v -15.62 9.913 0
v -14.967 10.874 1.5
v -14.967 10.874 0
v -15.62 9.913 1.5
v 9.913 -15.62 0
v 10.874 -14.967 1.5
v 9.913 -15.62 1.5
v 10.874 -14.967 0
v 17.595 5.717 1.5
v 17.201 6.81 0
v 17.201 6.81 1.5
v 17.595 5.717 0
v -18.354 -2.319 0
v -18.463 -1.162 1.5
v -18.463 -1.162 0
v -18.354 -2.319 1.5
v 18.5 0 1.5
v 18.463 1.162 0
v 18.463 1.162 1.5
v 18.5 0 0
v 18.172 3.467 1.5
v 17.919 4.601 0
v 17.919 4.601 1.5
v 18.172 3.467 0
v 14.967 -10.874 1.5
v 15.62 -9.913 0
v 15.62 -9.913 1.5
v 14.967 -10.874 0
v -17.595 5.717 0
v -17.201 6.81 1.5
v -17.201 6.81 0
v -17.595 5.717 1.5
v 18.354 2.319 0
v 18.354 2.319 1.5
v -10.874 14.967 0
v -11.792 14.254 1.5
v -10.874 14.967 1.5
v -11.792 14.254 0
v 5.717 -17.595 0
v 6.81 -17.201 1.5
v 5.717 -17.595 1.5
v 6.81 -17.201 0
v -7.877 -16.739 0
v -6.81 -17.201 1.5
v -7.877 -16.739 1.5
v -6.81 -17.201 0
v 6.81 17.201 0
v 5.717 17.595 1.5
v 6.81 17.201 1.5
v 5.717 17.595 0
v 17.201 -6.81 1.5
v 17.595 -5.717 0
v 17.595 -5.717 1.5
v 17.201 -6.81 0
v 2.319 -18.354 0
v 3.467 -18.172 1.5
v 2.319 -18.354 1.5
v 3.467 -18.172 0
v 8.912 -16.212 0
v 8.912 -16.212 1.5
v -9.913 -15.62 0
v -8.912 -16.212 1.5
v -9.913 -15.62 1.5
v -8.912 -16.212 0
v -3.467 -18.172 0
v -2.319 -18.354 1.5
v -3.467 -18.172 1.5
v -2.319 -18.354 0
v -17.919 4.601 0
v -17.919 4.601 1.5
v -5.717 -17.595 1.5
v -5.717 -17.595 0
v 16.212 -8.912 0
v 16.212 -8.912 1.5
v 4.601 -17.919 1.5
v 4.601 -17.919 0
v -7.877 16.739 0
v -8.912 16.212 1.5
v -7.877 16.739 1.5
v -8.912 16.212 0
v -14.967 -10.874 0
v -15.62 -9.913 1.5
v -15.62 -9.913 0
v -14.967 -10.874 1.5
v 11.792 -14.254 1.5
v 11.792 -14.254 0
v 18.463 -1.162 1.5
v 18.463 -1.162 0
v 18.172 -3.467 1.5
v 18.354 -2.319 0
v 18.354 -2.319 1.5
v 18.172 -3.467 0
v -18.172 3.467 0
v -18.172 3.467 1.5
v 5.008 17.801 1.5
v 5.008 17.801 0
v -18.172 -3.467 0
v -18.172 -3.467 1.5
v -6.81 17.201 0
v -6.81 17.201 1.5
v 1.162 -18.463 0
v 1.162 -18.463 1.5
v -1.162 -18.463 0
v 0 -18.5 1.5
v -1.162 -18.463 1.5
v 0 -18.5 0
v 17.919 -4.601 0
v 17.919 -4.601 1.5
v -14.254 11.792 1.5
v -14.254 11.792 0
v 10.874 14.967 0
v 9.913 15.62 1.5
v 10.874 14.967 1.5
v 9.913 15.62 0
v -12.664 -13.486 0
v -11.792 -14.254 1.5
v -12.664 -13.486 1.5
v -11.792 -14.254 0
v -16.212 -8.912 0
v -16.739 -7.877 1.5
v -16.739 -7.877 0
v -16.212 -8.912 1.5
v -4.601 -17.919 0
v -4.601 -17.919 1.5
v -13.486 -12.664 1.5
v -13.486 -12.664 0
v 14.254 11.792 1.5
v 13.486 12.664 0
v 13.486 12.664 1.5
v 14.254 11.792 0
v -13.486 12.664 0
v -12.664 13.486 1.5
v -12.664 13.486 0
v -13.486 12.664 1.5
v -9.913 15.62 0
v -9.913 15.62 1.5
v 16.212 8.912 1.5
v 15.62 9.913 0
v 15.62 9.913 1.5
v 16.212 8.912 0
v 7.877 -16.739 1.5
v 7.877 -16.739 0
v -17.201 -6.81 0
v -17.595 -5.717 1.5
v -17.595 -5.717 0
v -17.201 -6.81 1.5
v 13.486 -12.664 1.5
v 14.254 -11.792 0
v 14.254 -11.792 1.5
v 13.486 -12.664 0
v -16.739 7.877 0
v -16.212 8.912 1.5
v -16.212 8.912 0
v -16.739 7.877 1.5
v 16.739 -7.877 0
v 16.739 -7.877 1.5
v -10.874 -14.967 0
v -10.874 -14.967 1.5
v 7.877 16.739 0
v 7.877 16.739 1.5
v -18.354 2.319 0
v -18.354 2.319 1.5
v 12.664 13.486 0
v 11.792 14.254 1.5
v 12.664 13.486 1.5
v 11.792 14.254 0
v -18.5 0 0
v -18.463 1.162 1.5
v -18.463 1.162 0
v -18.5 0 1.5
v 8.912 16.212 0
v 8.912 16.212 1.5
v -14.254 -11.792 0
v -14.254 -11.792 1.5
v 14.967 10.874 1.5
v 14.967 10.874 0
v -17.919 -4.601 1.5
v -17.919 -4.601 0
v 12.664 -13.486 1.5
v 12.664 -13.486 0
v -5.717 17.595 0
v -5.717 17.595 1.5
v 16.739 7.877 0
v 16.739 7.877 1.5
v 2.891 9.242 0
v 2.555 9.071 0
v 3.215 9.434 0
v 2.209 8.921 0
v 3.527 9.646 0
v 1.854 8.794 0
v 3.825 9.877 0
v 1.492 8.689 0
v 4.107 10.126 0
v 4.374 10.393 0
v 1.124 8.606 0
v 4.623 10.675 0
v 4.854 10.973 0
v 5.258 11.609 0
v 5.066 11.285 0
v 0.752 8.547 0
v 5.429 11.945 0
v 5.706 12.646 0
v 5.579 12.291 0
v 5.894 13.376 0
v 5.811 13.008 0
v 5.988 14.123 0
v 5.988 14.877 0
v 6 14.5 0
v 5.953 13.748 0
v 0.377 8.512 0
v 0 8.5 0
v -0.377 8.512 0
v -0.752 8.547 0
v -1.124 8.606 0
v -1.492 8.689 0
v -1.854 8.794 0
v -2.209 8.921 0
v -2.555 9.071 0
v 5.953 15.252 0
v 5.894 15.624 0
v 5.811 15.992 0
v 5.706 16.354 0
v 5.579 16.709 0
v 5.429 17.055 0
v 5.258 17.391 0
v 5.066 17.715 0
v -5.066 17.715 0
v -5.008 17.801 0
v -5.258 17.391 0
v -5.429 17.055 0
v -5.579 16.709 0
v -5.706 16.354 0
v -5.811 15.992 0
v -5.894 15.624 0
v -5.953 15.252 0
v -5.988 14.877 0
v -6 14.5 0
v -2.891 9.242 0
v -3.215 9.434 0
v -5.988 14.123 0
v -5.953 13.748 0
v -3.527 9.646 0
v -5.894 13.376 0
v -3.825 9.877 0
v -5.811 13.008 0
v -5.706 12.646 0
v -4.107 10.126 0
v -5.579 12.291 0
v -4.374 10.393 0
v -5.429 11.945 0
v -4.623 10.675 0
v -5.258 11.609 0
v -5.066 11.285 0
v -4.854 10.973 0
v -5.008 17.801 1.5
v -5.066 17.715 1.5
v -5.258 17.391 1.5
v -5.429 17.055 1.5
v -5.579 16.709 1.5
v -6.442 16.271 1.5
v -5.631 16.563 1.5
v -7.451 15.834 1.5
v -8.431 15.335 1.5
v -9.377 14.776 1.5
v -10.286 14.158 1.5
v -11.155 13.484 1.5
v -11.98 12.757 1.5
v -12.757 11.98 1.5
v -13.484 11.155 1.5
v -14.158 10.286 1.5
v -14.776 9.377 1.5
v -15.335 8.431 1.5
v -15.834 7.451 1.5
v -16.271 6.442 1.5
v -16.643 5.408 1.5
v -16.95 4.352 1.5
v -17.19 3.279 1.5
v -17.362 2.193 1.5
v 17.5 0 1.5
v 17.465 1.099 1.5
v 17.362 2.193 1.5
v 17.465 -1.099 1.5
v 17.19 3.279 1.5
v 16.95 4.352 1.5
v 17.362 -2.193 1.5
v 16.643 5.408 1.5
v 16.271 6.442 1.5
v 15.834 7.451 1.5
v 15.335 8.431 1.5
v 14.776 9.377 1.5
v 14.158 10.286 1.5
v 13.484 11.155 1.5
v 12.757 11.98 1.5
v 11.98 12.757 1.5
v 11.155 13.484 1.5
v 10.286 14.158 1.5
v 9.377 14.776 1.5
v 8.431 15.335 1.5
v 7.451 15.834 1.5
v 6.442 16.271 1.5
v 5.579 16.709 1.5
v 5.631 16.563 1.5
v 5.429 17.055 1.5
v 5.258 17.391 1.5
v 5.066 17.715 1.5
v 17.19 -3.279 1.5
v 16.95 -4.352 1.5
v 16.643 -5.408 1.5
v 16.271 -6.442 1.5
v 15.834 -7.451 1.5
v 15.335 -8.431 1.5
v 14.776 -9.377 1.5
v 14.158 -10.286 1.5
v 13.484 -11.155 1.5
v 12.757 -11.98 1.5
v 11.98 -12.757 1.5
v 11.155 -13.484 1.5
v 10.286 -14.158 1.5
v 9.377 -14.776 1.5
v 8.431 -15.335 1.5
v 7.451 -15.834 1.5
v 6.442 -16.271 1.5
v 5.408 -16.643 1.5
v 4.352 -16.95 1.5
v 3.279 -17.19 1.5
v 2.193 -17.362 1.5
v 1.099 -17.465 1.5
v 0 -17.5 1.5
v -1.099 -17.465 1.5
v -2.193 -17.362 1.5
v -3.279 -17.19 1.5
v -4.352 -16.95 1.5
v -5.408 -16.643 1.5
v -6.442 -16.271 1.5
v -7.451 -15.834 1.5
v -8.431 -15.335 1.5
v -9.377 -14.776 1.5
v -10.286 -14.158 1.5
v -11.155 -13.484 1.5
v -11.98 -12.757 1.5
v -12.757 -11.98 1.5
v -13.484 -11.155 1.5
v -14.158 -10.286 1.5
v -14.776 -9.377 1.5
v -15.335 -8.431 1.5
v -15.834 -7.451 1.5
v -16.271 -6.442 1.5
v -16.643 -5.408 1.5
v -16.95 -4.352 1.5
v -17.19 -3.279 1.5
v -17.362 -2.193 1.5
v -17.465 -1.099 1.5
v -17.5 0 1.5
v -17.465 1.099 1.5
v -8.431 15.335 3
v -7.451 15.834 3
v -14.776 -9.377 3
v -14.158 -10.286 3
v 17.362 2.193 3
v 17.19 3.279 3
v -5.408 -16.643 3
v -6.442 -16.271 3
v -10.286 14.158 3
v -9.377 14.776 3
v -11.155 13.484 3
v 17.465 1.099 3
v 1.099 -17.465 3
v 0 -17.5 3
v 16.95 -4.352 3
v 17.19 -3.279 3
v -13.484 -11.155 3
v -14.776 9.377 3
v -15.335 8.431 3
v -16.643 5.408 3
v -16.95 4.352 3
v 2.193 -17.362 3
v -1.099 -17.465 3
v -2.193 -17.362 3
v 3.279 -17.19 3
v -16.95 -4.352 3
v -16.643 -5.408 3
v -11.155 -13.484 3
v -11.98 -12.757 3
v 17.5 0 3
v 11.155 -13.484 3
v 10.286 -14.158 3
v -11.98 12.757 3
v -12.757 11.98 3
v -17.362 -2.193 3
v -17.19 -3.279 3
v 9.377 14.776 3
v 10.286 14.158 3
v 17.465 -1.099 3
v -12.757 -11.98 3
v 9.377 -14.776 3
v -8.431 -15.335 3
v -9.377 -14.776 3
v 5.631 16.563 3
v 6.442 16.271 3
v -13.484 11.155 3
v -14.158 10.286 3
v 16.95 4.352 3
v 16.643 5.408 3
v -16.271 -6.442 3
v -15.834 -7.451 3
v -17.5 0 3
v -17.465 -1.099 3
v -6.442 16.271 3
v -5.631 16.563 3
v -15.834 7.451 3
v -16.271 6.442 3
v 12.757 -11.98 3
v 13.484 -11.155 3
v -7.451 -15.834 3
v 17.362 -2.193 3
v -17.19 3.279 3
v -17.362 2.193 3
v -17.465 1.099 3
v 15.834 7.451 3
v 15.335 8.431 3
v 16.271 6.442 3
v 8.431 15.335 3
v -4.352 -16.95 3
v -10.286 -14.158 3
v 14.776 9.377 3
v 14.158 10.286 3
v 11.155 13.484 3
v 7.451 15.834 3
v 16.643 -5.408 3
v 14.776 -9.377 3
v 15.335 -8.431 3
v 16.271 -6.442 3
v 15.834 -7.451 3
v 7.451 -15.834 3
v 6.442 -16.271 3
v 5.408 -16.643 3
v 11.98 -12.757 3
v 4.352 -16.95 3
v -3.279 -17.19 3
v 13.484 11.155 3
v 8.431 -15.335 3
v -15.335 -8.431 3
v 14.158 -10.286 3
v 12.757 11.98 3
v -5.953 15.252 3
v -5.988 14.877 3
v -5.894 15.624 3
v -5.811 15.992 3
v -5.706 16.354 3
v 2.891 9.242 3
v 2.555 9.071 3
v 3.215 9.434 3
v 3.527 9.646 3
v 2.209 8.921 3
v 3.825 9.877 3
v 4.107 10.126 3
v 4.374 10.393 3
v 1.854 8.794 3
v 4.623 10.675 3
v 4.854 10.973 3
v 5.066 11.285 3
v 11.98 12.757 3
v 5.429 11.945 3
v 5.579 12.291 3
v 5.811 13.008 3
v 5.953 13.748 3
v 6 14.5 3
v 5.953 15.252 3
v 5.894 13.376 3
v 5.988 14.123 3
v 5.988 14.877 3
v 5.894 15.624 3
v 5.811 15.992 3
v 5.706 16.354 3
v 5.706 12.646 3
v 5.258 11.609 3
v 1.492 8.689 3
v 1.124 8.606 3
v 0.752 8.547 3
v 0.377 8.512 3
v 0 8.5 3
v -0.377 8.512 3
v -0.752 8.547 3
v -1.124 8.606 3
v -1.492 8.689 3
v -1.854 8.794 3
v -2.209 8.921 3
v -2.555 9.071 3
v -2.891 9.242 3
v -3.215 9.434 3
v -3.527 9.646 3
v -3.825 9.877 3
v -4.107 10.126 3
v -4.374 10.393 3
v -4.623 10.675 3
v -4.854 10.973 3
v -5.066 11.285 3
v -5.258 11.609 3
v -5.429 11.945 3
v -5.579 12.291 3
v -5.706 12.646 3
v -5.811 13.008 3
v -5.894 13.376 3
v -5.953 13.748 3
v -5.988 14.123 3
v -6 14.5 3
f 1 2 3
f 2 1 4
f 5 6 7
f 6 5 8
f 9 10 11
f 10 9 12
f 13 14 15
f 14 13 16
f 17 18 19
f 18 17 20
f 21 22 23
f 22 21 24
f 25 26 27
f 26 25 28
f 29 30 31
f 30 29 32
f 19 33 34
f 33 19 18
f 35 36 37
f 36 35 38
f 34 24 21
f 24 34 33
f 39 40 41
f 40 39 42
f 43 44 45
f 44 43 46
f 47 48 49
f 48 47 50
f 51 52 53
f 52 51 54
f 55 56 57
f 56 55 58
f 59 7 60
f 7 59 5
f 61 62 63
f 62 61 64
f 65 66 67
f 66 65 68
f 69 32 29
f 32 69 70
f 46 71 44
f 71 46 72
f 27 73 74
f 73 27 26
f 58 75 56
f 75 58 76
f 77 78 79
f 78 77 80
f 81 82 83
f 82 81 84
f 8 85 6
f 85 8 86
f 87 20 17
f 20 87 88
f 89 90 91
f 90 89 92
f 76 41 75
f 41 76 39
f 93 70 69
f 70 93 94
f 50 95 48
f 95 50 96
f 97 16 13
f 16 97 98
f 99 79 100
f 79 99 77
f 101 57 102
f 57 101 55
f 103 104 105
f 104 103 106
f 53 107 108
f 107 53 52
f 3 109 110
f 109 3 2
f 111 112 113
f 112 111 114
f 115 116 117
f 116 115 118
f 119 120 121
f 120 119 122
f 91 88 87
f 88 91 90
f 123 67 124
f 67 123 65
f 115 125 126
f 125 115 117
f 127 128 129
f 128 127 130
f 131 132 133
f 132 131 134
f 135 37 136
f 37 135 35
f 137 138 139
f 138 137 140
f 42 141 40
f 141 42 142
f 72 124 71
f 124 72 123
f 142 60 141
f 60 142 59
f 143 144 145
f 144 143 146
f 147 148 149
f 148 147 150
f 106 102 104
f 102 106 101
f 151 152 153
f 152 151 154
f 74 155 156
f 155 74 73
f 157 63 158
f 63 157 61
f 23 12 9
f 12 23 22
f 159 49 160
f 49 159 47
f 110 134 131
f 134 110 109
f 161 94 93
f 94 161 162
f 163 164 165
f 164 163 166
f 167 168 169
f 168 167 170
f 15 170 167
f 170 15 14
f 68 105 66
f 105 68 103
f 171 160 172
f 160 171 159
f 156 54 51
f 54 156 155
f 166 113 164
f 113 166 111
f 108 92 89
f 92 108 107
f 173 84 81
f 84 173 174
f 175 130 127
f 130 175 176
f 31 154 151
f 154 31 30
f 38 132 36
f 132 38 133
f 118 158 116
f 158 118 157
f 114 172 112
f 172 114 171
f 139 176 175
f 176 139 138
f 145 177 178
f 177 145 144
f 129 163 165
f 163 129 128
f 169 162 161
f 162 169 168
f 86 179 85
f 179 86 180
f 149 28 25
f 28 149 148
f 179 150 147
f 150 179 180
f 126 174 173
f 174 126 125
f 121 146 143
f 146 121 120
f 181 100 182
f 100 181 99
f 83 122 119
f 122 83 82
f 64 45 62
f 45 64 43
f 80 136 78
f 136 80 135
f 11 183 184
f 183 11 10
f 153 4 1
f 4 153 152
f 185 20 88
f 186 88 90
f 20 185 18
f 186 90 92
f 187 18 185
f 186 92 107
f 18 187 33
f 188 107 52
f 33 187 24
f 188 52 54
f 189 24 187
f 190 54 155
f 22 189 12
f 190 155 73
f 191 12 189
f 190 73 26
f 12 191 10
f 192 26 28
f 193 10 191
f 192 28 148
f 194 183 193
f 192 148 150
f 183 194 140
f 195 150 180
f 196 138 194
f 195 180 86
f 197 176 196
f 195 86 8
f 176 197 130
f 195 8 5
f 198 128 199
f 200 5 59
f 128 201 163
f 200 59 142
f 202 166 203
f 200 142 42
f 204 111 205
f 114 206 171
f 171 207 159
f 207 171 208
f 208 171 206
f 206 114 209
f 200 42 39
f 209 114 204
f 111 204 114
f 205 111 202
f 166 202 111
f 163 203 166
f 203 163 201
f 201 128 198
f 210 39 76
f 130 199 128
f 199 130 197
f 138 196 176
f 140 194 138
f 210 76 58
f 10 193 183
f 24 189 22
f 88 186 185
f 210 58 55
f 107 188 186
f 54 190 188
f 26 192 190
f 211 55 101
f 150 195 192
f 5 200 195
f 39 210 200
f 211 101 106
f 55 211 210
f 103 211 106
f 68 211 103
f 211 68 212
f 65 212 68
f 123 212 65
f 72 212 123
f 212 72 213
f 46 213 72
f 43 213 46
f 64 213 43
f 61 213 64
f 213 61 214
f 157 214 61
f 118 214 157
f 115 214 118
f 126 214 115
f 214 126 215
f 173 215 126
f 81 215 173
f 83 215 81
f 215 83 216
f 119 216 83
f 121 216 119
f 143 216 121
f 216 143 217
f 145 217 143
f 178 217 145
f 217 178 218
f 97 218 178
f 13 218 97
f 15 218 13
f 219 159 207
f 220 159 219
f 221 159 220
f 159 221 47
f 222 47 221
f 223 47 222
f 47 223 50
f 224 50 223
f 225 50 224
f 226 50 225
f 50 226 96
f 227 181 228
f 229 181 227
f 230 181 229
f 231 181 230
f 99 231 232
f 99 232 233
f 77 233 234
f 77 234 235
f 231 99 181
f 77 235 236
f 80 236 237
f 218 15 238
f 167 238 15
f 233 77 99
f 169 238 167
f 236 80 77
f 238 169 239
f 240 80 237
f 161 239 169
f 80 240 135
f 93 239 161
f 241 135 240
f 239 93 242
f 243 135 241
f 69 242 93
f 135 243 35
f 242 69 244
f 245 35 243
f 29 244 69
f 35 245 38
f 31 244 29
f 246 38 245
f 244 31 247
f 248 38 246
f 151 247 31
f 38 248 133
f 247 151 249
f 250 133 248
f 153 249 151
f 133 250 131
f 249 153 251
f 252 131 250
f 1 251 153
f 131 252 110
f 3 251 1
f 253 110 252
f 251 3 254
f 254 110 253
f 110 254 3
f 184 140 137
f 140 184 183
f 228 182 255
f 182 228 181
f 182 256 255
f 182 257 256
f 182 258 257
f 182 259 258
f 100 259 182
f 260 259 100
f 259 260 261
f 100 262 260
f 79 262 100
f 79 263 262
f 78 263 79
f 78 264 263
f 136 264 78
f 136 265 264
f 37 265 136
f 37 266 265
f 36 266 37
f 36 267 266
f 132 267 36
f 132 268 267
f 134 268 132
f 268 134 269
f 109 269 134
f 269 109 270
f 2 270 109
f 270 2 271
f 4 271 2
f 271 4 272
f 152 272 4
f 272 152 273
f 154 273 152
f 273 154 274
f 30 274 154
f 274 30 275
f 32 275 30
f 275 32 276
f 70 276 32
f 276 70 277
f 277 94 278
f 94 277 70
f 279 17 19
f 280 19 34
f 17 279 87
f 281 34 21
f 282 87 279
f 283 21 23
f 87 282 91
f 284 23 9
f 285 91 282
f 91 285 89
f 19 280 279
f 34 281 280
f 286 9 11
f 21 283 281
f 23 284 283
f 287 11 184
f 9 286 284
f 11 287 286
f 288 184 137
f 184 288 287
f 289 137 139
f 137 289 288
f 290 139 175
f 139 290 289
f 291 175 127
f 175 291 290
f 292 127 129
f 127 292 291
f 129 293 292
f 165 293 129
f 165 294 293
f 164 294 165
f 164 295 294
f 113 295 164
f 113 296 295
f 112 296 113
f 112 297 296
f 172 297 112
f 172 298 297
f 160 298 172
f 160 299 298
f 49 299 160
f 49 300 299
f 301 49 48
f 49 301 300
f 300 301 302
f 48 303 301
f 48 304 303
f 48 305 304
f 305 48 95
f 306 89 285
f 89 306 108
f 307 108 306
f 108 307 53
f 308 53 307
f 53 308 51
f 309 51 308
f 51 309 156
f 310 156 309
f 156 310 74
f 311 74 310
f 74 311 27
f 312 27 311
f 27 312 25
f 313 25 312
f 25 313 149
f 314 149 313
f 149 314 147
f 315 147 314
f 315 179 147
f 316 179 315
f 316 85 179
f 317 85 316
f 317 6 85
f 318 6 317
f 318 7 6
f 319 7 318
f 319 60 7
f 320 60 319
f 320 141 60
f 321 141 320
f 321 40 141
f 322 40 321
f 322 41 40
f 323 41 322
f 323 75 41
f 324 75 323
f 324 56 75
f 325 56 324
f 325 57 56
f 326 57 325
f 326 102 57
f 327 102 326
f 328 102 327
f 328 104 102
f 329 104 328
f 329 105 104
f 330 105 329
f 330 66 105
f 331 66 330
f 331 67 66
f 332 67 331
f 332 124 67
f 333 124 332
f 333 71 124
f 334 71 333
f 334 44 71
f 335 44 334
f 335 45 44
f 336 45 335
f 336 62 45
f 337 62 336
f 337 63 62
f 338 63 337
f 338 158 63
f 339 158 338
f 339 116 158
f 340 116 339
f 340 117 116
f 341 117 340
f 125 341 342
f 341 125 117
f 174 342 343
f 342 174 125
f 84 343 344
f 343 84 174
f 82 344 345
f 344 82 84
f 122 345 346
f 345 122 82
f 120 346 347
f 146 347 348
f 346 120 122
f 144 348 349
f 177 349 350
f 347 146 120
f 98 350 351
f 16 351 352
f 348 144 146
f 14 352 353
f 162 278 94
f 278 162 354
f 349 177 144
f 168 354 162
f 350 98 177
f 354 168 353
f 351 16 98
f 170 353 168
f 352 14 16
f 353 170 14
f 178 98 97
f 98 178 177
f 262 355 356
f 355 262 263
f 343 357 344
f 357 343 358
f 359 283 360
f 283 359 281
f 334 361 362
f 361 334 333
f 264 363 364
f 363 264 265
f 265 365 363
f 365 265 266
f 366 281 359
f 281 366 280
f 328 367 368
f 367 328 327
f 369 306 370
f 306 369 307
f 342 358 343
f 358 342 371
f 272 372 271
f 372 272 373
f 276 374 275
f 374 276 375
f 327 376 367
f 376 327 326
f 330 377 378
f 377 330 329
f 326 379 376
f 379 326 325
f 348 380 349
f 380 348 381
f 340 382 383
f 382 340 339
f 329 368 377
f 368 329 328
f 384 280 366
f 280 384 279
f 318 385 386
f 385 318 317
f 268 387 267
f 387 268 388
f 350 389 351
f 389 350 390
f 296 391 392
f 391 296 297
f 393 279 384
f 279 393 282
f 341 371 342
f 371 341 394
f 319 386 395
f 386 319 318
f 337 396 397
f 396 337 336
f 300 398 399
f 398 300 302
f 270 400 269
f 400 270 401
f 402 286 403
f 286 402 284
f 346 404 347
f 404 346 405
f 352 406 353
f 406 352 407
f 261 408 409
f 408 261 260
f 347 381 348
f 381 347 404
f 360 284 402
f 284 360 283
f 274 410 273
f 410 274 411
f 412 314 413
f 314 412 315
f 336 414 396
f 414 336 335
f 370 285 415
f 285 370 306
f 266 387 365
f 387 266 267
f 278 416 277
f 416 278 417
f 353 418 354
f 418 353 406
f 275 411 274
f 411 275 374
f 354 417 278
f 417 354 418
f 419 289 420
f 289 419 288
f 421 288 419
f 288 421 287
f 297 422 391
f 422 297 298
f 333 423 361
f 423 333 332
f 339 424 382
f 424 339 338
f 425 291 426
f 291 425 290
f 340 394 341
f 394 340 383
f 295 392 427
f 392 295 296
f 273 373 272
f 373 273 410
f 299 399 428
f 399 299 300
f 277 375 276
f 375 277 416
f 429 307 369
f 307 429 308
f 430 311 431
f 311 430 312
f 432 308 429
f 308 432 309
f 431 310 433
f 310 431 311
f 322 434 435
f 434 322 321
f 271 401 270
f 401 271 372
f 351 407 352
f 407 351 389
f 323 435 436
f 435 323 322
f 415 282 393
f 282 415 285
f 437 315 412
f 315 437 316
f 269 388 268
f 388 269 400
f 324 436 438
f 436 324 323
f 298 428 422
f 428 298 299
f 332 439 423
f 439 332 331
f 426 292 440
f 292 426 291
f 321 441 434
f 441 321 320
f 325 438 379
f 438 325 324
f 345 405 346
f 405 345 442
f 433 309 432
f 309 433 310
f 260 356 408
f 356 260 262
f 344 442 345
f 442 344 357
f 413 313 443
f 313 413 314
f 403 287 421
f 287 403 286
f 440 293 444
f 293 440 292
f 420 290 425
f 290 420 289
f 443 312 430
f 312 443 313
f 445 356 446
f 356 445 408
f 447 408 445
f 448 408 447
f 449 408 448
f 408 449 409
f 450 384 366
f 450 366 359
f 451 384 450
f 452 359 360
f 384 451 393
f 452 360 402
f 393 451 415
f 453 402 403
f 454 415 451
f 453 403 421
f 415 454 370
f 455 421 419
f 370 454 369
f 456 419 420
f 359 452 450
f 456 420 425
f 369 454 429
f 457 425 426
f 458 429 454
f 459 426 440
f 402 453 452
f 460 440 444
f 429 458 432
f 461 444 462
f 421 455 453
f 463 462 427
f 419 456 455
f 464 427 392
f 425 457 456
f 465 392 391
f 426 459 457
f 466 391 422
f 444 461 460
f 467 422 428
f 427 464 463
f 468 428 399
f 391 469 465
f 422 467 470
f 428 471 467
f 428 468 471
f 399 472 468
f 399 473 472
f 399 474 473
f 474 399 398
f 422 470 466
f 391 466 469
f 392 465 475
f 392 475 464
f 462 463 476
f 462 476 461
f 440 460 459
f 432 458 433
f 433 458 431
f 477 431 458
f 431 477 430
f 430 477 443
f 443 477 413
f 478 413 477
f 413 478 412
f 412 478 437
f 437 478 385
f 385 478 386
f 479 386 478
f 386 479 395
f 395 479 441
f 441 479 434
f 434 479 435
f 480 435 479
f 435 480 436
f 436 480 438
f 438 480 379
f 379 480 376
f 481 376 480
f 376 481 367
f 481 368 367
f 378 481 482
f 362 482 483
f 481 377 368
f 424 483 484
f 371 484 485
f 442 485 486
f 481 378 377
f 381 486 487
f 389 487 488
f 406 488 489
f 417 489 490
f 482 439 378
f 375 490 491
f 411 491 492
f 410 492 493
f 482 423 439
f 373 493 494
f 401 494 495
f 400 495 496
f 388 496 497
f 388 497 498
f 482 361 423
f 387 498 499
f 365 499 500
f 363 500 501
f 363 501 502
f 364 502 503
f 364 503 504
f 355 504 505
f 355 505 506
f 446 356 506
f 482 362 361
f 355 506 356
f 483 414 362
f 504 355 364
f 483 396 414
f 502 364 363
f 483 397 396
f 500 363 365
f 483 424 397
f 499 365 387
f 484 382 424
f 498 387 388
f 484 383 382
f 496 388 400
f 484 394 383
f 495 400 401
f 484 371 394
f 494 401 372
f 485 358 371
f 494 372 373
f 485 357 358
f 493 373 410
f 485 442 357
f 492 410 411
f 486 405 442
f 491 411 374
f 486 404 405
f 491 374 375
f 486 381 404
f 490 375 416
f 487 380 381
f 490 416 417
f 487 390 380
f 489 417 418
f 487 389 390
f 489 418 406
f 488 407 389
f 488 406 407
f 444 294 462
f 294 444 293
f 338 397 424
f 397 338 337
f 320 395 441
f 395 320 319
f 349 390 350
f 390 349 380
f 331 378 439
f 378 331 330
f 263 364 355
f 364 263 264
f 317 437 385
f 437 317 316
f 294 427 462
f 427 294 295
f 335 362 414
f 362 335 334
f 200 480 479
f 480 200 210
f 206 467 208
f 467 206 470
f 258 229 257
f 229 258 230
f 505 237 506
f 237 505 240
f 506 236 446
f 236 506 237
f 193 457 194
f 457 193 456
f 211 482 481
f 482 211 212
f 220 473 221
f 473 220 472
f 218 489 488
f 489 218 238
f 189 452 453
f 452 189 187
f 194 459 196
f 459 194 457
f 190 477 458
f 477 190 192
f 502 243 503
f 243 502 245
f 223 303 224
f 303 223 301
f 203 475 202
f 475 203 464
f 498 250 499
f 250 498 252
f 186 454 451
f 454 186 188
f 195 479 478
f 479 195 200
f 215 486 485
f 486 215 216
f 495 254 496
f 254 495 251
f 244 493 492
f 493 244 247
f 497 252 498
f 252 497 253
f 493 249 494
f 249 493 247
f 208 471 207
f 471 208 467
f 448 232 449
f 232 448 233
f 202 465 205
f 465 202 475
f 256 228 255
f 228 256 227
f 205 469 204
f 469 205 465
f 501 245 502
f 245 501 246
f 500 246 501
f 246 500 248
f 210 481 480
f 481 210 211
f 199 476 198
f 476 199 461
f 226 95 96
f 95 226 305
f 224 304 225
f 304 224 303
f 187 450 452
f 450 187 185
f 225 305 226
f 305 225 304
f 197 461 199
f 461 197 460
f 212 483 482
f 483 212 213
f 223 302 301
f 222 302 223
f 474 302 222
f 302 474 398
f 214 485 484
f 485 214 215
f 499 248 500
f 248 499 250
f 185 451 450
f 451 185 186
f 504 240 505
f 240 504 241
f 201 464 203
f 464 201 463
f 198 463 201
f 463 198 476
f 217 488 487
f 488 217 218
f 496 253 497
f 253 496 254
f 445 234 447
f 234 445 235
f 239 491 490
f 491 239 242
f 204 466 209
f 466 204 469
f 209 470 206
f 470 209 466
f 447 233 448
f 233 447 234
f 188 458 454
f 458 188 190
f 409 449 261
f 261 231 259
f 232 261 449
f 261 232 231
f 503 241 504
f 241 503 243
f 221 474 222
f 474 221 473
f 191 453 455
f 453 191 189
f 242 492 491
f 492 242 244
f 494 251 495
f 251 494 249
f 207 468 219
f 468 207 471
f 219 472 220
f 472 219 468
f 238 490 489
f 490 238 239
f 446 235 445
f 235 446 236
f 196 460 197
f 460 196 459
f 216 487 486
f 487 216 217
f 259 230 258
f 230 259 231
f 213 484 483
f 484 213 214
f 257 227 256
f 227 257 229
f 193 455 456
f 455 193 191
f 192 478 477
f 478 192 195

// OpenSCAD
$fn=100;

    difference() {
        union() {
            linear_extrude(1.5)
            circle(d=37);
            
            color("red")
            linear_extrude(3)
            circle(d=35);
        }
        
        linear_extrude(100)
        translate([0, 25/2+2, 0])
        circle(d=12);
        
    }
